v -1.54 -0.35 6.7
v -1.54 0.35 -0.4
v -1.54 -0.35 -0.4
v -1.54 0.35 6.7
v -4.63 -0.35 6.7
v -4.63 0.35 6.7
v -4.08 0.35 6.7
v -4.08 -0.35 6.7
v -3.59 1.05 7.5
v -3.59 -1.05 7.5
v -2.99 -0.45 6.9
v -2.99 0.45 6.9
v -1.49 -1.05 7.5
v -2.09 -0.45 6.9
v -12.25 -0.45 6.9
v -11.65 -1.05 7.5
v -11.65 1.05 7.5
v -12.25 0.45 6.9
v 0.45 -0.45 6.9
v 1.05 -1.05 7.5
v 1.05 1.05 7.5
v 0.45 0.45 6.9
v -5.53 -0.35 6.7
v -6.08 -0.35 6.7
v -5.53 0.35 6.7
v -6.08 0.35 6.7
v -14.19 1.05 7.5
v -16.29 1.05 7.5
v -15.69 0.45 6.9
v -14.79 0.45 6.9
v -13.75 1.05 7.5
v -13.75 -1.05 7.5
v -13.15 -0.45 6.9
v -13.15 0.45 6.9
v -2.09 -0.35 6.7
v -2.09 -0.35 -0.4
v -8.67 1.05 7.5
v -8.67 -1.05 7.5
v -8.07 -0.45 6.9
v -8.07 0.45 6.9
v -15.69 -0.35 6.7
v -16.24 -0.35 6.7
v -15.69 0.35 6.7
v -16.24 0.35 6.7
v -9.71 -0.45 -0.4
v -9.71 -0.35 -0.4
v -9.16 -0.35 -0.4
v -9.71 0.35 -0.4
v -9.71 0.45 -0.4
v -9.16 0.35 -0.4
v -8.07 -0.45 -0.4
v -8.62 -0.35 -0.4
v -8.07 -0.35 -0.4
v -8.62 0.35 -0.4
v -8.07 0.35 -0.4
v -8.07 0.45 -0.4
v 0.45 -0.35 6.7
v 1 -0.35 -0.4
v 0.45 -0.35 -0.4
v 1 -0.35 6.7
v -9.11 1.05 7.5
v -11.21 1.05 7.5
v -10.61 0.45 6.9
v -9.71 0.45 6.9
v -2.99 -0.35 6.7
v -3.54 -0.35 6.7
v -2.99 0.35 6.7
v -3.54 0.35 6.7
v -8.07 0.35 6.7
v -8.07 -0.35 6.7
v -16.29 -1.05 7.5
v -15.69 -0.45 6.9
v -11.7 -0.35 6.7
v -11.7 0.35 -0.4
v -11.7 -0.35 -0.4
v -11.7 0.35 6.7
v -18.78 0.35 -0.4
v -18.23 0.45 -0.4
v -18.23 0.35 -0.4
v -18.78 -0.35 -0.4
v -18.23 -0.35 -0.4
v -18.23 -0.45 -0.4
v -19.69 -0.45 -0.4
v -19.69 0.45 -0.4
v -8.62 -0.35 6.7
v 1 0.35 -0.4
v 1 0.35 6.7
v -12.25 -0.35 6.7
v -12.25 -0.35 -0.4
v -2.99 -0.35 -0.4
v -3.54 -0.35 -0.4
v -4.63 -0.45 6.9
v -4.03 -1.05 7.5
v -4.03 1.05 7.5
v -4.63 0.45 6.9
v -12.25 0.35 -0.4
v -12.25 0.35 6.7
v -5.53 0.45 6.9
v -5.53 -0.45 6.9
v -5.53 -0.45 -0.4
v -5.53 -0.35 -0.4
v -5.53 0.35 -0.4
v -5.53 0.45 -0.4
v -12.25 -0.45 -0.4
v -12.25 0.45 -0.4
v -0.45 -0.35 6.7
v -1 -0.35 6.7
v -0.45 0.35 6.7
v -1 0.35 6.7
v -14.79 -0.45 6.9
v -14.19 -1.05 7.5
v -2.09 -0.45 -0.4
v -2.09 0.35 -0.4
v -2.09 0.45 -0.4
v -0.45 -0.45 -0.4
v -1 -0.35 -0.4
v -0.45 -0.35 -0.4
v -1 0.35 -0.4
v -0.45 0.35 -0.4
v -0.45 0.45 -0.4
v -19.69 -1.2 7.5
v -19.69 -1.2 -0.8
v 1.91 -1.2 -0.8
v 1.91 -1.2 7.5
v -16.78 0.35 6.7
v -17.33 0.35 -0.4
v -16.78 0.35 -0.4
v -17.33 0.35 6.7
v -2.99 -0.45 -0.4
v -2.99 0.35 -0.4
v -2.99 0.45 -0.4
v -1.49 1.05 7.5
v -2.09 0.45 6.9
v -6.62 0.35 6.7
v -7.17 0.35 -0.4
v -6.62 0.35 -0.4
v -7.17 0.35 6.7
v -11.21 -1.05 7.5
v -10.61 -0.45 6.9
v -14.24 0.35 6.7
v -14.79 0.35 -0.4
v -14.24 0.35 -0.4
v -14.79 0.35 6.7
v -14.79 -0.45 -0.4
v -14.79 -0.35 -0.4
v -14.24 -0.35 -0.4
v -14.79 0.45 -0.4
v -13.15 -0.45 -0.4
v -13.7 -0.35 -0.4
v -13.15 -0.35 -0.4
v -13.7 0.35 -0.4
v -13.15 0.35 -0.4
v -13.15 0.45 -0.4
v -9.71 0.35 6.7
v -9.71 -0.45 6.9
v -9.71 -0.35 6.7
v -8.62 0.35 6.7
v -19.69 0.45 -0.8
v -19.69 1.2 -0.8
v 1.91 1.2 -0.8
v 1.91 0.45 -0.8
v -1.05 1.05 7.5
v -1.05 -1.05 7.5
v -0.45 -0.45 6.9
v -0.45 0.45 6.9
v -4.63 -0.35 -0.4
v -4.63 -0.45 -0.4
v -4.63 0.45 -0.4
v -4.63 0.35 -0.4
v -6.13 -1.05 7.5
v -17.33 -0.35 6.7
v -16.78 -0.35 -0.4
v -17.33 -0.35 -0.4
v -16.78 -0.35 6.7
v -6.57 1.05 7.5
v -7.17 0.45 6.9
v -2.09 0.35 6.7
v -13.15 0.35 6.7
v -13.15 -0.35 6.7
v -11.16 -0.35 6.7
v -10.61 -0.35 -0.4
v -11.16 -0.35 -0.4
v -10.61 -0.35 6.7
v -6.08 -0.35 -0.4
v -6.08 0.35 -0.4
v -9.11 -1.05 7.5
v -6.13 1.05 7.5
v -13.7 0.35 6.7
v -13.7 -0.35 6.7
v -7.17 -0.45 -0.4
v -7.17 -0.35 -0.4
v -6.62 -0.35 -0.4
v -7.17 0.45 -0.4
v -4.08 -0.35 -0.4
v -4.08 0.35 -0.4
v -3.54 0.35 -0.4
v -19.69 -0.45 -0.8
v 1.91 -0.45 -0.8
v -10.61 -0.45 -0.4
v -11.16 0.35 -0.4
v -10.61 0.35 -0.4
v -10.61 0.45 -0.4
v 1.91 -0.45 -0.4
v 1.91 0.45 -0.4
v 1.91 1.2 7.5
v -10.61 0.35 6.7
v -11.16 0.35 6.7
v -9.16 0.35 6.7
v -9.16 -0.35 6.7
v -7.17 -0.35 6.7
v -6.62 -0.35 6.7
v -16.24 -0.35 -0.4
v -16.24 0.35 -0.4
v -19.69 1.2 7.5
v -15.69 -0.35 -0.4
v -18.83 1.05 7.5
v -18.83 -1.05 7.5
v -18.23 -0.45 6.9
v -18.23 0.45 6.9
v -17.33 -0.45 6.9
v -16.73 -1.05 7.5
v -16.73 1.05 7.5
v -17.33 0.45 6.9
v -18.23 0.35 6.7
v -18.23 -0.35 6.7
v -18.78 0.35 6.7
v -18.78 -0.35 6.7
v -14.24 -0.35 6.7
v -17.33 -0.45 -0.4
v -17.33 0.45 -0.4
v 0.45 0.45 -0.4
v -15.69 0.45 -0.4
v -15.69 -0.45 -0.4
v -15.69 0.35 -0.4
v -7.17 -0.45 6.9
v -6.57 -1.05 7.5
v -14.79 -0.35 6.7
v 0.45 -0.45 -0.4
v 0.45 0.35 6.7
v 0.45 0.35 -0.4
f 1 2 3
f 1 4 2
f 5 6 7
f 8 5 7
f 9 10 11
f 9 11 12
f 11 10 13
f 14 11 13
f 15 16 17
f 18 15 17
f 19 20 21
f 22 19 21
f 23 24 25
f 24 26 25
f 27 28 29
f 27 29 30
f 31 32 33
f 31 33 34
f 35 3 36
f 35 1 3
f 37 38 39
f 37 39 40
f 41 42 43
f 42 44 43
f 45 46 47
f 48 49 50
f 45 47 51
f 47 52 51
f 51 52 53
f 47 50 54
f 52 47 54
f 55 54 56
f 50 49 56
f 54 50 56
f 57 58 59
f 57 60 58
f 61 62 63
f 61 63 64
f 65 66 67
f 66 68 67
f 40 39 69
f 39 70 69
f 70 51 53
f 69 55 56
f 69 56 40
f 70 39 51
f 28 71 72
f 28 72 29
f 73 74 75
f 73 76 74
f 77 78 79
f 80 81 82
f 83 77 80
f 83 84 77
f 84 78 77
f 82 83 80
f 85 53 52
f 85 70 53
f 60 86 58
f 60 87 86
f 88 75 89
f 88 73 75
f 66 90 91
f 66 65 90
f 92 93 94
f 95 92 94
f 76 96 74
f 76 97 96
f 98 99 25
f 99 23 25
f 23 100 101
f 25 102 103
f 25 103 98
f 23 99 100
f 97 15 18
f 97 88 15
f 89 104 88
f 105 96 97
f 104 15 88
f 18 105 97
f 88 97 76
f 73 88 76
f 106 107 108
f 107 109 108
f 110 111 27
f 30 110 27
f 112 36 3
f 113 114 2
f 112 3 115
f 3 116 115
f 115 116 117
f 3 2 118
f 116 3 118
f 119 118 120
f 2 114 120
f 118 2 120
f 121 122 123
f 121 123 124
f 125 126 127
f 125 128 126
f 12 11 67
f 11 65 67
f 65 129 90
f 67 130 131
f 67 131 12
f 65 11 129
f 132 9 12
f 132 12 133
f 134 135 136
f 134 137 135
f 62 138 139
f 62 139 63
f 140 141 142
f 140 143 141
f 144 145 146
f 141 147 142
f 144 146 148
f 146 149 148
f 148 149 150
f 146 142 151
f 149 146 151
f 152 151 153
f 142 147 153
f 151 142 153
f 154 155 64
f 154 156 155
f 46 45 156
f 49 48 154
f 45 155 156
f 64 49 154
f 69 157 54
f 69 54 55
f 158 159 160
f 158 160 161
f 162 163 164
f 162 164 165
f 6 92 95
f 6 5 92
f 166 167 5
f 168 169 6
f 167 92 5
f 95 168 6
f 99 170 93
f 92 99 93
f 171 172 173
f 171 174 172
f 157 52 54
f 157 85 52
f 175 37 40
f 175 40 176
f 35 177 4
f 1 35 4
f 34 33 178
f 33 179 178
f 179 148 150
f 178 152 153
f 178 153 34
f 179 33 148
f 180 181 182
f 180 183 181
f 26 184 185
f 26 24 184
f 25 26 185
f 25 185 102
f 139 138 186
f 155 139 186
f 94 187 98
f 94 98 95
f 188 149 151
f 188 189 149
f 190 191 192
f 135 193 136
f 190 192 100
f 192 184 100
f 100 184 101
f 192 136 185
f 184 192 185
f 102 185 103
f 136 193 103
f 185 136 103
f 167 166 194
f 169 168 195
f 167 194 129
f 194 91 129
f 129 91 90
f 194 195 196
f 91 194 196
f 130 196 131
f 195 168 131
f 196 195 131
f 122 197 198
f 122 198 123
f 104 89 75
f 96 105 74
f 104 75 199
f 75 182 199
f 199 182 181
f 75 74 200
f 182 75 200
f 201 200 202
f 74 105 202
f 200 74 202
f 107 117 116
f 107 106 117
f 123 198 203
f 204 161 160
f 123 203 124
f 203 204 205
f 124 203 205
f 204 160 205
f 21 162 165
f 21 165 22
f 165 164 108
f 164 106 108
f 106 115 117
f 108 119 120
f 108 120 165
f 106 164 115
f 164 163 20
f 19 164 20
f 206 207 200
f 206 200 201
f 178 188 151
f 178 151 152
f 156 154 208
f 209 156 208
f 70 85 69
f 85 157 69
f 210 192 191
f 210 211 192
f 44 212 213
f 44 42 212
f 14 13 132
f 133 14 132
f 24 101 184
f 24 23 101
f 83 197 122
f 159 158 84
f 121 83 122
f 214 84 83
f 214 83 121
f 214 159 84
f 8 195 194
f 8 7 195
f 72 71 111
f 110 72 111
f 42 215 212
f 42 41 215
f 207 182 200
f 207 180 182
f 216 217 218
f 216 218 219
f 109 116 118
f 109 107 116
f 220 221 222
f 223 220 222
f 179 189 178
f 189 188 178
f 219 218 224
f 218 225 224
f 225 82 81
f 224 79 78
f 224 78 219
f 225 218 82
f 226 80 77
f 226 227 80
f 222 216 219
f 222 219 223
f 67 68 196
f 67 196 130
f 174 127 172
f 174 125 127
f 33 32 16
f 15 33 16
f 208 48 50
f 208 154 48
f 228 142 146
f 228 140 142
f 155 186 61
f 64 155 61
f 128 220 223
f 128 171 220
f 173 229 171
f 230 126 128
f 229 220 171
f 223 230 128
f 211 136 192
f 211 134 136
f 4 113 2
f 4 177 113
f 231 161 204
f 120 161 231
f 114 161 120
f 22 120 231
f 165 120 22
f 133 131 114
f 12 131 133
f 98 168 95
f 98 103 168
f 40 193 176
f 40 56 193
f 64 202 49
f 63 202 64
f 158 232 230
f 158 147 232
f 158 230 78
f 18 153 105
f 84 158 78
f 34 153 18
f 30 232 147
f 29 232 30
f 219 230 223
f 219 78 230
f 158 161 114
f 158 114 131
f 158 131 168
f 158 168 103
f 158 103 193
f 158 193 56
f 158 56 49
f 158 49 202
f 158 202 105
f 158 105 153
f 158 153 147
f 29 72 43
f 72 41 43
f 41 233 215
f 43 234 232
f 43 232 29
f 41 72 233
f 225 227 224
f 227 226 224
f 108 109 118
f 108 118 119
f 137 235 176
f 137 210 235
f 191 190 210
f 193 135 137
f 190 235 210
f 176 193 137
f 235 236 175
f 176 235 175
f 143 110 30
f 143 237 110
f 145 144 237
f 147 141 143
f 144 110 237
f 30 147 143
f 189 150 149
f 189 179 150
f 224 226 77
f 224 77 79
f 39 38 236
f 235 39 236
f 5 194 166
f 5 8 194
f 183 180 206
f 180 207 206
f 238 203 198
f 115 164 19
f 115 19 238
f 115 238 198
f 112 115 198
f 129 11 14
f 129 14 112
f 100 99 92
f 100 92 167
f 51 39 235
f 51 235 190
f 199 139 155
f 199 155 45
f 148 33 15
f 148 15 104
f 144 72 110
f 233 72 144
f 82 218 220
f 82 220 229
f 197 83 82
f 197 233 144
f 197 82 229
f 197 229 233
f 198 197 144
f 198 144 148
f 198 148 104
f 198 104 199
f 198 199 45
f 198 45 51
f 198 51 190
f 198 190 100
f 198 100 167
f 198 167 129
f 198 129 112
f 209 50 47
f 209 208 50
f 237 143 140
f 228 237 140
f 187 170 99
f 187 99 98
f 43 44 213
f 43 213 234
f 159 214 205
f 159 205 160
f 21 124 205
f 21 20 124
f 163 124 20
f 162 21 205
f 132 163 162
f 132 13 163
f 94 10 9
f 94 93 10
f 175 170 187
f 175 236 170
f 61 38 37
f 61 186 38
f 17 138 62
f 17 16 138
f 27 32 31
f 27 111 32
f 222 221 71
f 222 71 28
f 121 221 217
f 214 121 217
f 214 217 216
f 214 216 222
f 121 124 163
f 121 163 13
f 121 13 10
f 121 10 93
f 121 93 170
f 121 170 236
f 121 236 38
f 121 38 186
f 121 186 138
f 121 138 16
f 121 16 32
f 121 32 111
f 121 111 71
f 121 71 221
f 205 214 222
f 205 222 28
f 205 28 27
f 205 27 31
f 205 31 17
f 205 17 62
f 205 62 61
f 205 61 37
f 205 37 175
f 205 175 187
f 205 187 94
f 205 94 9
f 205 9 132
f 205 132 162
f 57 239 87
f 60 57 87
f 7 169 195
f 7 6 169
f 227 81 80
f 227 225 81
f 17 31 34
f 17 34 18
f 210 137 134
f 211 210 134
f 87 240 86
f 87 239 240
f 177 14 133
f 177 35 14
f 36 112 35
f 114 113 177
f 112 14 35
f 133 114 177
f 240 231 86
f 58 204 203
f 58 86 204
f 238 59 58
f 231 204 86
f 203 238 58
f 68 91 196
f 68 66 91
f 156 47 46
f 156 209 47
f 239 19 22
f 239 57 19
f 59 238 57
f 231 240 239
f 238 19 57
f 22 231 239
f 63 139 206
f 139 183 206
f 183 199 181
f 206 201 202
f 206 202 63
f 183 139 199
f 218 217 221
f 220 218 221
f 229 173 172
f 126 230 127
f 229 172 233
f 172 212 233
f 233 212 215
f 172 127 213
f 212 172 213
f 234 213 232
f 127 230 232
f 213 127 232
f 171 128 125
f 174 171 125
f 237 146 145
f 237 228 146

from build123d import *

# Parameters (mm, degrees)
SKETCH_222_W              = 2.54
SKETCH_222_H              = 2.4
EXTRUDE_699_DEPTH         = 6.7
EXTRUDE_699_DEPTH_BACK    = 0.4
SKETCH_753_W              = 2.54
SKETCH_753_H              = 0.75
EXTRUDE_1132_DEPTH        = 0.4
SKETCH_1186_W             = 2.54
SKETCH_1186_H             = 2.4
SKETCH_1186_W_2           = 0.9
SKETCH_1186_H_2           = 0.9
EXTRUDE_1471_DEPTH        = 0.8
CHAMFER_1532_SIZE         = 0.6
PATTERN_LINEAR_1658_COUNT = 8
PATTERN_LINEAR_1658_PITCH = 2.54
EXTRUDE_1_DEPTH           = 0.64
EXTRUDE_START             = -20.96
EXTRUDE_2_DEPTH           = 0.64


with BuildPart() as part:
    # Sketch 222 → Extrude 699 (new body, two sides)
    with BuildSketch(Plane.XY) as extrude_699_sk:
        Rectangle(SKETCH_222_W, SKETCH_222_H)
        Polygon((-1, 0.35), (-0.45, 0.35), (-0.45, 0.45), (0.45, 0.45), (0.45, 0.35), (1, 0.35), (1, -0.35), (0.45, -0.35), (0.45, -0.45), (-0.45, -0.45), (-0.45, -0.35), (-1, -0.35), align=None, mode=Mode.SUBTRACT)
    extrude(amount=EXTRUDE_699_DEPTH)
    extrude(extrude_699_sk.sketch, amount=-EXTRUDE_699_DEPTH_BACK)

    # Sketch 753 → Extrude 1132 (add)
    with BuildSketch(Plane(origin=(0, 0, -0.4), x_dir=(-1, 0, 0), z_dir=(0, 0, -1))):
        with Locations((0, -0.825)):
            Rectangle(SKETCH_753_W, SKETCH_753_H)
        with Locations((0, 0.825)):
            Rectangle(SKETCH_753_W, SKETCH_753_H)
    extrude(amount=EXTRUDE_1132_DEPTH)

    # Sketch 1186 → Extrude 1471 (add)
    with BuildSketch(Plane.XY.offset(6.7)):
        Rectangle(SKETCH_1186_W, SKETCH_1186_H)
        Rectangle(SKETCH_1186_W_2, SKETCH_1186_H_2, mode=Mode.SUBTRACT)
    extrude(amount=EXTRUDE_1471_DEPTH)

    # Chamfer 1532
    chamfer_1532_edges = [part.edges().sort_by_distance(p)[0] for p in [
        (0.45, 0, 7.5),
        (0, 0.45, 7.5),
        (-0.45, 0, 7.5),
        (0, -0.45, 7.5),
    ]]
    chamfer(chamfer_1532_edges, length=CHAMFER_1532_SIZE)


with BuildPart() as pattern_linear_1658_1:
    # Pattern Linear 1658: pattern copy
    add(part.part.moved(Location(Vector(-1, 0, 0) * (1 * PATTERN_LINEAR_1658_PITCH))))


with BuildPart() as pattern_linear_1658_2:
    # Pattern Linear 1658: pattern copy
    add(part.part.moved(Location(Vector(-1, 0, 0) * (2 * PATTERN_LINEAR_1658_PITCH))))


with BuildPart() as pattern_linear_1658_3:
    # Pattern Linear 1658: pattern copy
    add(part.part.moved(Location(Vector(-1, 0, 0) * (3 * PATTERN_LINEAR_1658_PITCH))))


with BuildPart() as pattern_linear_1658_4:
    # Pattern Linear 1658: pattern copy
    add(part.part.moved(Location(Vector(-1, 0, 0) * (4 * PATTERN_LINEAR_1658_PITCH))))


with BuildPart() as pattern_linear_1658_5:
    # Pattern Linear 1658: pattern copy
    add(part.part.moved(Location(Vector(-1, 0, 0) * (5 * PATTERN_LINEAR_1658_PITCH))))


with BuildPart() as pattern_linear_1658_6:
    # Pattern Linear 1658: pattern copy
    add(part.part.moved(Location(Vector(-1, 0, 0) * (6 * PATTERN_LINEAR_1658_PITCH))))


with BuildPart() as pattern_linear_1658_7:
    # Pattern Linear 1658: pattern copy
    add(part.part.moved(Location(Vector(-1, 0, 0) * (7 * PATTERN_LINEAR_1658_PITCH))))


with BuildPart() as part_1:
    add(part.part)

    # Combine 1774: union Pattern Linear 1658_7, Pattern Linear 1658_6, Pattern Linear 1658_5, Pattern Linear 1658_4, Pattern Linear 1658_3, Pattern Linear 1658_2, Pattern Linear 1658_1
    add(pattern_linear_1658_7.part)
    add(pattern_linear_1658_6.part)
    add(pattern_linear_1658_5.part)
    add(pattern_linear_1658_4.part)
    add(pattern_linear_1658_3.part)
    add(pattern_linear_1658_2.part)
    add(pattern_linear_1658_1.part)

    # Sketch 2582 → Бобышка-БоковаяНакладка1 (add)
    with BuildSketch(Plane(origin=(1.27, 0, 0), x_dir=(0, 0, -1), z_dir=(1, 0, 0))):
        Polygon((0.8, 1.2), (0.8, 0.45), (0.4, 0.45), (0.4, -0.45), (0.8, -0.45), (0.8, -1.2), (-7.5, -1.2), (-7.5, 1.2), align=None)
    extrude(amount=EXTRUDE_1_DEPTH)

    # Эскиз-БоковаяНакладка<2> → Бобышка-БоковаяНакладка2 (add)
    with BuildSketch(Plane(origin=(1.27, 0, 0), x_dir=(0, 0, -1), z_dir=(1, 0, 0)).offset(EXTRUDE_START)):
        Polygon((0.8, 1.2), (0.8, 0.45), (0.4, 0.45), (0.4, -0.45), (0.8, -0.45), (0.8, -1.2), (-7.5, -1.2), (-7.5, 1.2), align=None)
    extrude(amount=EXTRUDE_2_DEPTH)


solid = part_1.part
